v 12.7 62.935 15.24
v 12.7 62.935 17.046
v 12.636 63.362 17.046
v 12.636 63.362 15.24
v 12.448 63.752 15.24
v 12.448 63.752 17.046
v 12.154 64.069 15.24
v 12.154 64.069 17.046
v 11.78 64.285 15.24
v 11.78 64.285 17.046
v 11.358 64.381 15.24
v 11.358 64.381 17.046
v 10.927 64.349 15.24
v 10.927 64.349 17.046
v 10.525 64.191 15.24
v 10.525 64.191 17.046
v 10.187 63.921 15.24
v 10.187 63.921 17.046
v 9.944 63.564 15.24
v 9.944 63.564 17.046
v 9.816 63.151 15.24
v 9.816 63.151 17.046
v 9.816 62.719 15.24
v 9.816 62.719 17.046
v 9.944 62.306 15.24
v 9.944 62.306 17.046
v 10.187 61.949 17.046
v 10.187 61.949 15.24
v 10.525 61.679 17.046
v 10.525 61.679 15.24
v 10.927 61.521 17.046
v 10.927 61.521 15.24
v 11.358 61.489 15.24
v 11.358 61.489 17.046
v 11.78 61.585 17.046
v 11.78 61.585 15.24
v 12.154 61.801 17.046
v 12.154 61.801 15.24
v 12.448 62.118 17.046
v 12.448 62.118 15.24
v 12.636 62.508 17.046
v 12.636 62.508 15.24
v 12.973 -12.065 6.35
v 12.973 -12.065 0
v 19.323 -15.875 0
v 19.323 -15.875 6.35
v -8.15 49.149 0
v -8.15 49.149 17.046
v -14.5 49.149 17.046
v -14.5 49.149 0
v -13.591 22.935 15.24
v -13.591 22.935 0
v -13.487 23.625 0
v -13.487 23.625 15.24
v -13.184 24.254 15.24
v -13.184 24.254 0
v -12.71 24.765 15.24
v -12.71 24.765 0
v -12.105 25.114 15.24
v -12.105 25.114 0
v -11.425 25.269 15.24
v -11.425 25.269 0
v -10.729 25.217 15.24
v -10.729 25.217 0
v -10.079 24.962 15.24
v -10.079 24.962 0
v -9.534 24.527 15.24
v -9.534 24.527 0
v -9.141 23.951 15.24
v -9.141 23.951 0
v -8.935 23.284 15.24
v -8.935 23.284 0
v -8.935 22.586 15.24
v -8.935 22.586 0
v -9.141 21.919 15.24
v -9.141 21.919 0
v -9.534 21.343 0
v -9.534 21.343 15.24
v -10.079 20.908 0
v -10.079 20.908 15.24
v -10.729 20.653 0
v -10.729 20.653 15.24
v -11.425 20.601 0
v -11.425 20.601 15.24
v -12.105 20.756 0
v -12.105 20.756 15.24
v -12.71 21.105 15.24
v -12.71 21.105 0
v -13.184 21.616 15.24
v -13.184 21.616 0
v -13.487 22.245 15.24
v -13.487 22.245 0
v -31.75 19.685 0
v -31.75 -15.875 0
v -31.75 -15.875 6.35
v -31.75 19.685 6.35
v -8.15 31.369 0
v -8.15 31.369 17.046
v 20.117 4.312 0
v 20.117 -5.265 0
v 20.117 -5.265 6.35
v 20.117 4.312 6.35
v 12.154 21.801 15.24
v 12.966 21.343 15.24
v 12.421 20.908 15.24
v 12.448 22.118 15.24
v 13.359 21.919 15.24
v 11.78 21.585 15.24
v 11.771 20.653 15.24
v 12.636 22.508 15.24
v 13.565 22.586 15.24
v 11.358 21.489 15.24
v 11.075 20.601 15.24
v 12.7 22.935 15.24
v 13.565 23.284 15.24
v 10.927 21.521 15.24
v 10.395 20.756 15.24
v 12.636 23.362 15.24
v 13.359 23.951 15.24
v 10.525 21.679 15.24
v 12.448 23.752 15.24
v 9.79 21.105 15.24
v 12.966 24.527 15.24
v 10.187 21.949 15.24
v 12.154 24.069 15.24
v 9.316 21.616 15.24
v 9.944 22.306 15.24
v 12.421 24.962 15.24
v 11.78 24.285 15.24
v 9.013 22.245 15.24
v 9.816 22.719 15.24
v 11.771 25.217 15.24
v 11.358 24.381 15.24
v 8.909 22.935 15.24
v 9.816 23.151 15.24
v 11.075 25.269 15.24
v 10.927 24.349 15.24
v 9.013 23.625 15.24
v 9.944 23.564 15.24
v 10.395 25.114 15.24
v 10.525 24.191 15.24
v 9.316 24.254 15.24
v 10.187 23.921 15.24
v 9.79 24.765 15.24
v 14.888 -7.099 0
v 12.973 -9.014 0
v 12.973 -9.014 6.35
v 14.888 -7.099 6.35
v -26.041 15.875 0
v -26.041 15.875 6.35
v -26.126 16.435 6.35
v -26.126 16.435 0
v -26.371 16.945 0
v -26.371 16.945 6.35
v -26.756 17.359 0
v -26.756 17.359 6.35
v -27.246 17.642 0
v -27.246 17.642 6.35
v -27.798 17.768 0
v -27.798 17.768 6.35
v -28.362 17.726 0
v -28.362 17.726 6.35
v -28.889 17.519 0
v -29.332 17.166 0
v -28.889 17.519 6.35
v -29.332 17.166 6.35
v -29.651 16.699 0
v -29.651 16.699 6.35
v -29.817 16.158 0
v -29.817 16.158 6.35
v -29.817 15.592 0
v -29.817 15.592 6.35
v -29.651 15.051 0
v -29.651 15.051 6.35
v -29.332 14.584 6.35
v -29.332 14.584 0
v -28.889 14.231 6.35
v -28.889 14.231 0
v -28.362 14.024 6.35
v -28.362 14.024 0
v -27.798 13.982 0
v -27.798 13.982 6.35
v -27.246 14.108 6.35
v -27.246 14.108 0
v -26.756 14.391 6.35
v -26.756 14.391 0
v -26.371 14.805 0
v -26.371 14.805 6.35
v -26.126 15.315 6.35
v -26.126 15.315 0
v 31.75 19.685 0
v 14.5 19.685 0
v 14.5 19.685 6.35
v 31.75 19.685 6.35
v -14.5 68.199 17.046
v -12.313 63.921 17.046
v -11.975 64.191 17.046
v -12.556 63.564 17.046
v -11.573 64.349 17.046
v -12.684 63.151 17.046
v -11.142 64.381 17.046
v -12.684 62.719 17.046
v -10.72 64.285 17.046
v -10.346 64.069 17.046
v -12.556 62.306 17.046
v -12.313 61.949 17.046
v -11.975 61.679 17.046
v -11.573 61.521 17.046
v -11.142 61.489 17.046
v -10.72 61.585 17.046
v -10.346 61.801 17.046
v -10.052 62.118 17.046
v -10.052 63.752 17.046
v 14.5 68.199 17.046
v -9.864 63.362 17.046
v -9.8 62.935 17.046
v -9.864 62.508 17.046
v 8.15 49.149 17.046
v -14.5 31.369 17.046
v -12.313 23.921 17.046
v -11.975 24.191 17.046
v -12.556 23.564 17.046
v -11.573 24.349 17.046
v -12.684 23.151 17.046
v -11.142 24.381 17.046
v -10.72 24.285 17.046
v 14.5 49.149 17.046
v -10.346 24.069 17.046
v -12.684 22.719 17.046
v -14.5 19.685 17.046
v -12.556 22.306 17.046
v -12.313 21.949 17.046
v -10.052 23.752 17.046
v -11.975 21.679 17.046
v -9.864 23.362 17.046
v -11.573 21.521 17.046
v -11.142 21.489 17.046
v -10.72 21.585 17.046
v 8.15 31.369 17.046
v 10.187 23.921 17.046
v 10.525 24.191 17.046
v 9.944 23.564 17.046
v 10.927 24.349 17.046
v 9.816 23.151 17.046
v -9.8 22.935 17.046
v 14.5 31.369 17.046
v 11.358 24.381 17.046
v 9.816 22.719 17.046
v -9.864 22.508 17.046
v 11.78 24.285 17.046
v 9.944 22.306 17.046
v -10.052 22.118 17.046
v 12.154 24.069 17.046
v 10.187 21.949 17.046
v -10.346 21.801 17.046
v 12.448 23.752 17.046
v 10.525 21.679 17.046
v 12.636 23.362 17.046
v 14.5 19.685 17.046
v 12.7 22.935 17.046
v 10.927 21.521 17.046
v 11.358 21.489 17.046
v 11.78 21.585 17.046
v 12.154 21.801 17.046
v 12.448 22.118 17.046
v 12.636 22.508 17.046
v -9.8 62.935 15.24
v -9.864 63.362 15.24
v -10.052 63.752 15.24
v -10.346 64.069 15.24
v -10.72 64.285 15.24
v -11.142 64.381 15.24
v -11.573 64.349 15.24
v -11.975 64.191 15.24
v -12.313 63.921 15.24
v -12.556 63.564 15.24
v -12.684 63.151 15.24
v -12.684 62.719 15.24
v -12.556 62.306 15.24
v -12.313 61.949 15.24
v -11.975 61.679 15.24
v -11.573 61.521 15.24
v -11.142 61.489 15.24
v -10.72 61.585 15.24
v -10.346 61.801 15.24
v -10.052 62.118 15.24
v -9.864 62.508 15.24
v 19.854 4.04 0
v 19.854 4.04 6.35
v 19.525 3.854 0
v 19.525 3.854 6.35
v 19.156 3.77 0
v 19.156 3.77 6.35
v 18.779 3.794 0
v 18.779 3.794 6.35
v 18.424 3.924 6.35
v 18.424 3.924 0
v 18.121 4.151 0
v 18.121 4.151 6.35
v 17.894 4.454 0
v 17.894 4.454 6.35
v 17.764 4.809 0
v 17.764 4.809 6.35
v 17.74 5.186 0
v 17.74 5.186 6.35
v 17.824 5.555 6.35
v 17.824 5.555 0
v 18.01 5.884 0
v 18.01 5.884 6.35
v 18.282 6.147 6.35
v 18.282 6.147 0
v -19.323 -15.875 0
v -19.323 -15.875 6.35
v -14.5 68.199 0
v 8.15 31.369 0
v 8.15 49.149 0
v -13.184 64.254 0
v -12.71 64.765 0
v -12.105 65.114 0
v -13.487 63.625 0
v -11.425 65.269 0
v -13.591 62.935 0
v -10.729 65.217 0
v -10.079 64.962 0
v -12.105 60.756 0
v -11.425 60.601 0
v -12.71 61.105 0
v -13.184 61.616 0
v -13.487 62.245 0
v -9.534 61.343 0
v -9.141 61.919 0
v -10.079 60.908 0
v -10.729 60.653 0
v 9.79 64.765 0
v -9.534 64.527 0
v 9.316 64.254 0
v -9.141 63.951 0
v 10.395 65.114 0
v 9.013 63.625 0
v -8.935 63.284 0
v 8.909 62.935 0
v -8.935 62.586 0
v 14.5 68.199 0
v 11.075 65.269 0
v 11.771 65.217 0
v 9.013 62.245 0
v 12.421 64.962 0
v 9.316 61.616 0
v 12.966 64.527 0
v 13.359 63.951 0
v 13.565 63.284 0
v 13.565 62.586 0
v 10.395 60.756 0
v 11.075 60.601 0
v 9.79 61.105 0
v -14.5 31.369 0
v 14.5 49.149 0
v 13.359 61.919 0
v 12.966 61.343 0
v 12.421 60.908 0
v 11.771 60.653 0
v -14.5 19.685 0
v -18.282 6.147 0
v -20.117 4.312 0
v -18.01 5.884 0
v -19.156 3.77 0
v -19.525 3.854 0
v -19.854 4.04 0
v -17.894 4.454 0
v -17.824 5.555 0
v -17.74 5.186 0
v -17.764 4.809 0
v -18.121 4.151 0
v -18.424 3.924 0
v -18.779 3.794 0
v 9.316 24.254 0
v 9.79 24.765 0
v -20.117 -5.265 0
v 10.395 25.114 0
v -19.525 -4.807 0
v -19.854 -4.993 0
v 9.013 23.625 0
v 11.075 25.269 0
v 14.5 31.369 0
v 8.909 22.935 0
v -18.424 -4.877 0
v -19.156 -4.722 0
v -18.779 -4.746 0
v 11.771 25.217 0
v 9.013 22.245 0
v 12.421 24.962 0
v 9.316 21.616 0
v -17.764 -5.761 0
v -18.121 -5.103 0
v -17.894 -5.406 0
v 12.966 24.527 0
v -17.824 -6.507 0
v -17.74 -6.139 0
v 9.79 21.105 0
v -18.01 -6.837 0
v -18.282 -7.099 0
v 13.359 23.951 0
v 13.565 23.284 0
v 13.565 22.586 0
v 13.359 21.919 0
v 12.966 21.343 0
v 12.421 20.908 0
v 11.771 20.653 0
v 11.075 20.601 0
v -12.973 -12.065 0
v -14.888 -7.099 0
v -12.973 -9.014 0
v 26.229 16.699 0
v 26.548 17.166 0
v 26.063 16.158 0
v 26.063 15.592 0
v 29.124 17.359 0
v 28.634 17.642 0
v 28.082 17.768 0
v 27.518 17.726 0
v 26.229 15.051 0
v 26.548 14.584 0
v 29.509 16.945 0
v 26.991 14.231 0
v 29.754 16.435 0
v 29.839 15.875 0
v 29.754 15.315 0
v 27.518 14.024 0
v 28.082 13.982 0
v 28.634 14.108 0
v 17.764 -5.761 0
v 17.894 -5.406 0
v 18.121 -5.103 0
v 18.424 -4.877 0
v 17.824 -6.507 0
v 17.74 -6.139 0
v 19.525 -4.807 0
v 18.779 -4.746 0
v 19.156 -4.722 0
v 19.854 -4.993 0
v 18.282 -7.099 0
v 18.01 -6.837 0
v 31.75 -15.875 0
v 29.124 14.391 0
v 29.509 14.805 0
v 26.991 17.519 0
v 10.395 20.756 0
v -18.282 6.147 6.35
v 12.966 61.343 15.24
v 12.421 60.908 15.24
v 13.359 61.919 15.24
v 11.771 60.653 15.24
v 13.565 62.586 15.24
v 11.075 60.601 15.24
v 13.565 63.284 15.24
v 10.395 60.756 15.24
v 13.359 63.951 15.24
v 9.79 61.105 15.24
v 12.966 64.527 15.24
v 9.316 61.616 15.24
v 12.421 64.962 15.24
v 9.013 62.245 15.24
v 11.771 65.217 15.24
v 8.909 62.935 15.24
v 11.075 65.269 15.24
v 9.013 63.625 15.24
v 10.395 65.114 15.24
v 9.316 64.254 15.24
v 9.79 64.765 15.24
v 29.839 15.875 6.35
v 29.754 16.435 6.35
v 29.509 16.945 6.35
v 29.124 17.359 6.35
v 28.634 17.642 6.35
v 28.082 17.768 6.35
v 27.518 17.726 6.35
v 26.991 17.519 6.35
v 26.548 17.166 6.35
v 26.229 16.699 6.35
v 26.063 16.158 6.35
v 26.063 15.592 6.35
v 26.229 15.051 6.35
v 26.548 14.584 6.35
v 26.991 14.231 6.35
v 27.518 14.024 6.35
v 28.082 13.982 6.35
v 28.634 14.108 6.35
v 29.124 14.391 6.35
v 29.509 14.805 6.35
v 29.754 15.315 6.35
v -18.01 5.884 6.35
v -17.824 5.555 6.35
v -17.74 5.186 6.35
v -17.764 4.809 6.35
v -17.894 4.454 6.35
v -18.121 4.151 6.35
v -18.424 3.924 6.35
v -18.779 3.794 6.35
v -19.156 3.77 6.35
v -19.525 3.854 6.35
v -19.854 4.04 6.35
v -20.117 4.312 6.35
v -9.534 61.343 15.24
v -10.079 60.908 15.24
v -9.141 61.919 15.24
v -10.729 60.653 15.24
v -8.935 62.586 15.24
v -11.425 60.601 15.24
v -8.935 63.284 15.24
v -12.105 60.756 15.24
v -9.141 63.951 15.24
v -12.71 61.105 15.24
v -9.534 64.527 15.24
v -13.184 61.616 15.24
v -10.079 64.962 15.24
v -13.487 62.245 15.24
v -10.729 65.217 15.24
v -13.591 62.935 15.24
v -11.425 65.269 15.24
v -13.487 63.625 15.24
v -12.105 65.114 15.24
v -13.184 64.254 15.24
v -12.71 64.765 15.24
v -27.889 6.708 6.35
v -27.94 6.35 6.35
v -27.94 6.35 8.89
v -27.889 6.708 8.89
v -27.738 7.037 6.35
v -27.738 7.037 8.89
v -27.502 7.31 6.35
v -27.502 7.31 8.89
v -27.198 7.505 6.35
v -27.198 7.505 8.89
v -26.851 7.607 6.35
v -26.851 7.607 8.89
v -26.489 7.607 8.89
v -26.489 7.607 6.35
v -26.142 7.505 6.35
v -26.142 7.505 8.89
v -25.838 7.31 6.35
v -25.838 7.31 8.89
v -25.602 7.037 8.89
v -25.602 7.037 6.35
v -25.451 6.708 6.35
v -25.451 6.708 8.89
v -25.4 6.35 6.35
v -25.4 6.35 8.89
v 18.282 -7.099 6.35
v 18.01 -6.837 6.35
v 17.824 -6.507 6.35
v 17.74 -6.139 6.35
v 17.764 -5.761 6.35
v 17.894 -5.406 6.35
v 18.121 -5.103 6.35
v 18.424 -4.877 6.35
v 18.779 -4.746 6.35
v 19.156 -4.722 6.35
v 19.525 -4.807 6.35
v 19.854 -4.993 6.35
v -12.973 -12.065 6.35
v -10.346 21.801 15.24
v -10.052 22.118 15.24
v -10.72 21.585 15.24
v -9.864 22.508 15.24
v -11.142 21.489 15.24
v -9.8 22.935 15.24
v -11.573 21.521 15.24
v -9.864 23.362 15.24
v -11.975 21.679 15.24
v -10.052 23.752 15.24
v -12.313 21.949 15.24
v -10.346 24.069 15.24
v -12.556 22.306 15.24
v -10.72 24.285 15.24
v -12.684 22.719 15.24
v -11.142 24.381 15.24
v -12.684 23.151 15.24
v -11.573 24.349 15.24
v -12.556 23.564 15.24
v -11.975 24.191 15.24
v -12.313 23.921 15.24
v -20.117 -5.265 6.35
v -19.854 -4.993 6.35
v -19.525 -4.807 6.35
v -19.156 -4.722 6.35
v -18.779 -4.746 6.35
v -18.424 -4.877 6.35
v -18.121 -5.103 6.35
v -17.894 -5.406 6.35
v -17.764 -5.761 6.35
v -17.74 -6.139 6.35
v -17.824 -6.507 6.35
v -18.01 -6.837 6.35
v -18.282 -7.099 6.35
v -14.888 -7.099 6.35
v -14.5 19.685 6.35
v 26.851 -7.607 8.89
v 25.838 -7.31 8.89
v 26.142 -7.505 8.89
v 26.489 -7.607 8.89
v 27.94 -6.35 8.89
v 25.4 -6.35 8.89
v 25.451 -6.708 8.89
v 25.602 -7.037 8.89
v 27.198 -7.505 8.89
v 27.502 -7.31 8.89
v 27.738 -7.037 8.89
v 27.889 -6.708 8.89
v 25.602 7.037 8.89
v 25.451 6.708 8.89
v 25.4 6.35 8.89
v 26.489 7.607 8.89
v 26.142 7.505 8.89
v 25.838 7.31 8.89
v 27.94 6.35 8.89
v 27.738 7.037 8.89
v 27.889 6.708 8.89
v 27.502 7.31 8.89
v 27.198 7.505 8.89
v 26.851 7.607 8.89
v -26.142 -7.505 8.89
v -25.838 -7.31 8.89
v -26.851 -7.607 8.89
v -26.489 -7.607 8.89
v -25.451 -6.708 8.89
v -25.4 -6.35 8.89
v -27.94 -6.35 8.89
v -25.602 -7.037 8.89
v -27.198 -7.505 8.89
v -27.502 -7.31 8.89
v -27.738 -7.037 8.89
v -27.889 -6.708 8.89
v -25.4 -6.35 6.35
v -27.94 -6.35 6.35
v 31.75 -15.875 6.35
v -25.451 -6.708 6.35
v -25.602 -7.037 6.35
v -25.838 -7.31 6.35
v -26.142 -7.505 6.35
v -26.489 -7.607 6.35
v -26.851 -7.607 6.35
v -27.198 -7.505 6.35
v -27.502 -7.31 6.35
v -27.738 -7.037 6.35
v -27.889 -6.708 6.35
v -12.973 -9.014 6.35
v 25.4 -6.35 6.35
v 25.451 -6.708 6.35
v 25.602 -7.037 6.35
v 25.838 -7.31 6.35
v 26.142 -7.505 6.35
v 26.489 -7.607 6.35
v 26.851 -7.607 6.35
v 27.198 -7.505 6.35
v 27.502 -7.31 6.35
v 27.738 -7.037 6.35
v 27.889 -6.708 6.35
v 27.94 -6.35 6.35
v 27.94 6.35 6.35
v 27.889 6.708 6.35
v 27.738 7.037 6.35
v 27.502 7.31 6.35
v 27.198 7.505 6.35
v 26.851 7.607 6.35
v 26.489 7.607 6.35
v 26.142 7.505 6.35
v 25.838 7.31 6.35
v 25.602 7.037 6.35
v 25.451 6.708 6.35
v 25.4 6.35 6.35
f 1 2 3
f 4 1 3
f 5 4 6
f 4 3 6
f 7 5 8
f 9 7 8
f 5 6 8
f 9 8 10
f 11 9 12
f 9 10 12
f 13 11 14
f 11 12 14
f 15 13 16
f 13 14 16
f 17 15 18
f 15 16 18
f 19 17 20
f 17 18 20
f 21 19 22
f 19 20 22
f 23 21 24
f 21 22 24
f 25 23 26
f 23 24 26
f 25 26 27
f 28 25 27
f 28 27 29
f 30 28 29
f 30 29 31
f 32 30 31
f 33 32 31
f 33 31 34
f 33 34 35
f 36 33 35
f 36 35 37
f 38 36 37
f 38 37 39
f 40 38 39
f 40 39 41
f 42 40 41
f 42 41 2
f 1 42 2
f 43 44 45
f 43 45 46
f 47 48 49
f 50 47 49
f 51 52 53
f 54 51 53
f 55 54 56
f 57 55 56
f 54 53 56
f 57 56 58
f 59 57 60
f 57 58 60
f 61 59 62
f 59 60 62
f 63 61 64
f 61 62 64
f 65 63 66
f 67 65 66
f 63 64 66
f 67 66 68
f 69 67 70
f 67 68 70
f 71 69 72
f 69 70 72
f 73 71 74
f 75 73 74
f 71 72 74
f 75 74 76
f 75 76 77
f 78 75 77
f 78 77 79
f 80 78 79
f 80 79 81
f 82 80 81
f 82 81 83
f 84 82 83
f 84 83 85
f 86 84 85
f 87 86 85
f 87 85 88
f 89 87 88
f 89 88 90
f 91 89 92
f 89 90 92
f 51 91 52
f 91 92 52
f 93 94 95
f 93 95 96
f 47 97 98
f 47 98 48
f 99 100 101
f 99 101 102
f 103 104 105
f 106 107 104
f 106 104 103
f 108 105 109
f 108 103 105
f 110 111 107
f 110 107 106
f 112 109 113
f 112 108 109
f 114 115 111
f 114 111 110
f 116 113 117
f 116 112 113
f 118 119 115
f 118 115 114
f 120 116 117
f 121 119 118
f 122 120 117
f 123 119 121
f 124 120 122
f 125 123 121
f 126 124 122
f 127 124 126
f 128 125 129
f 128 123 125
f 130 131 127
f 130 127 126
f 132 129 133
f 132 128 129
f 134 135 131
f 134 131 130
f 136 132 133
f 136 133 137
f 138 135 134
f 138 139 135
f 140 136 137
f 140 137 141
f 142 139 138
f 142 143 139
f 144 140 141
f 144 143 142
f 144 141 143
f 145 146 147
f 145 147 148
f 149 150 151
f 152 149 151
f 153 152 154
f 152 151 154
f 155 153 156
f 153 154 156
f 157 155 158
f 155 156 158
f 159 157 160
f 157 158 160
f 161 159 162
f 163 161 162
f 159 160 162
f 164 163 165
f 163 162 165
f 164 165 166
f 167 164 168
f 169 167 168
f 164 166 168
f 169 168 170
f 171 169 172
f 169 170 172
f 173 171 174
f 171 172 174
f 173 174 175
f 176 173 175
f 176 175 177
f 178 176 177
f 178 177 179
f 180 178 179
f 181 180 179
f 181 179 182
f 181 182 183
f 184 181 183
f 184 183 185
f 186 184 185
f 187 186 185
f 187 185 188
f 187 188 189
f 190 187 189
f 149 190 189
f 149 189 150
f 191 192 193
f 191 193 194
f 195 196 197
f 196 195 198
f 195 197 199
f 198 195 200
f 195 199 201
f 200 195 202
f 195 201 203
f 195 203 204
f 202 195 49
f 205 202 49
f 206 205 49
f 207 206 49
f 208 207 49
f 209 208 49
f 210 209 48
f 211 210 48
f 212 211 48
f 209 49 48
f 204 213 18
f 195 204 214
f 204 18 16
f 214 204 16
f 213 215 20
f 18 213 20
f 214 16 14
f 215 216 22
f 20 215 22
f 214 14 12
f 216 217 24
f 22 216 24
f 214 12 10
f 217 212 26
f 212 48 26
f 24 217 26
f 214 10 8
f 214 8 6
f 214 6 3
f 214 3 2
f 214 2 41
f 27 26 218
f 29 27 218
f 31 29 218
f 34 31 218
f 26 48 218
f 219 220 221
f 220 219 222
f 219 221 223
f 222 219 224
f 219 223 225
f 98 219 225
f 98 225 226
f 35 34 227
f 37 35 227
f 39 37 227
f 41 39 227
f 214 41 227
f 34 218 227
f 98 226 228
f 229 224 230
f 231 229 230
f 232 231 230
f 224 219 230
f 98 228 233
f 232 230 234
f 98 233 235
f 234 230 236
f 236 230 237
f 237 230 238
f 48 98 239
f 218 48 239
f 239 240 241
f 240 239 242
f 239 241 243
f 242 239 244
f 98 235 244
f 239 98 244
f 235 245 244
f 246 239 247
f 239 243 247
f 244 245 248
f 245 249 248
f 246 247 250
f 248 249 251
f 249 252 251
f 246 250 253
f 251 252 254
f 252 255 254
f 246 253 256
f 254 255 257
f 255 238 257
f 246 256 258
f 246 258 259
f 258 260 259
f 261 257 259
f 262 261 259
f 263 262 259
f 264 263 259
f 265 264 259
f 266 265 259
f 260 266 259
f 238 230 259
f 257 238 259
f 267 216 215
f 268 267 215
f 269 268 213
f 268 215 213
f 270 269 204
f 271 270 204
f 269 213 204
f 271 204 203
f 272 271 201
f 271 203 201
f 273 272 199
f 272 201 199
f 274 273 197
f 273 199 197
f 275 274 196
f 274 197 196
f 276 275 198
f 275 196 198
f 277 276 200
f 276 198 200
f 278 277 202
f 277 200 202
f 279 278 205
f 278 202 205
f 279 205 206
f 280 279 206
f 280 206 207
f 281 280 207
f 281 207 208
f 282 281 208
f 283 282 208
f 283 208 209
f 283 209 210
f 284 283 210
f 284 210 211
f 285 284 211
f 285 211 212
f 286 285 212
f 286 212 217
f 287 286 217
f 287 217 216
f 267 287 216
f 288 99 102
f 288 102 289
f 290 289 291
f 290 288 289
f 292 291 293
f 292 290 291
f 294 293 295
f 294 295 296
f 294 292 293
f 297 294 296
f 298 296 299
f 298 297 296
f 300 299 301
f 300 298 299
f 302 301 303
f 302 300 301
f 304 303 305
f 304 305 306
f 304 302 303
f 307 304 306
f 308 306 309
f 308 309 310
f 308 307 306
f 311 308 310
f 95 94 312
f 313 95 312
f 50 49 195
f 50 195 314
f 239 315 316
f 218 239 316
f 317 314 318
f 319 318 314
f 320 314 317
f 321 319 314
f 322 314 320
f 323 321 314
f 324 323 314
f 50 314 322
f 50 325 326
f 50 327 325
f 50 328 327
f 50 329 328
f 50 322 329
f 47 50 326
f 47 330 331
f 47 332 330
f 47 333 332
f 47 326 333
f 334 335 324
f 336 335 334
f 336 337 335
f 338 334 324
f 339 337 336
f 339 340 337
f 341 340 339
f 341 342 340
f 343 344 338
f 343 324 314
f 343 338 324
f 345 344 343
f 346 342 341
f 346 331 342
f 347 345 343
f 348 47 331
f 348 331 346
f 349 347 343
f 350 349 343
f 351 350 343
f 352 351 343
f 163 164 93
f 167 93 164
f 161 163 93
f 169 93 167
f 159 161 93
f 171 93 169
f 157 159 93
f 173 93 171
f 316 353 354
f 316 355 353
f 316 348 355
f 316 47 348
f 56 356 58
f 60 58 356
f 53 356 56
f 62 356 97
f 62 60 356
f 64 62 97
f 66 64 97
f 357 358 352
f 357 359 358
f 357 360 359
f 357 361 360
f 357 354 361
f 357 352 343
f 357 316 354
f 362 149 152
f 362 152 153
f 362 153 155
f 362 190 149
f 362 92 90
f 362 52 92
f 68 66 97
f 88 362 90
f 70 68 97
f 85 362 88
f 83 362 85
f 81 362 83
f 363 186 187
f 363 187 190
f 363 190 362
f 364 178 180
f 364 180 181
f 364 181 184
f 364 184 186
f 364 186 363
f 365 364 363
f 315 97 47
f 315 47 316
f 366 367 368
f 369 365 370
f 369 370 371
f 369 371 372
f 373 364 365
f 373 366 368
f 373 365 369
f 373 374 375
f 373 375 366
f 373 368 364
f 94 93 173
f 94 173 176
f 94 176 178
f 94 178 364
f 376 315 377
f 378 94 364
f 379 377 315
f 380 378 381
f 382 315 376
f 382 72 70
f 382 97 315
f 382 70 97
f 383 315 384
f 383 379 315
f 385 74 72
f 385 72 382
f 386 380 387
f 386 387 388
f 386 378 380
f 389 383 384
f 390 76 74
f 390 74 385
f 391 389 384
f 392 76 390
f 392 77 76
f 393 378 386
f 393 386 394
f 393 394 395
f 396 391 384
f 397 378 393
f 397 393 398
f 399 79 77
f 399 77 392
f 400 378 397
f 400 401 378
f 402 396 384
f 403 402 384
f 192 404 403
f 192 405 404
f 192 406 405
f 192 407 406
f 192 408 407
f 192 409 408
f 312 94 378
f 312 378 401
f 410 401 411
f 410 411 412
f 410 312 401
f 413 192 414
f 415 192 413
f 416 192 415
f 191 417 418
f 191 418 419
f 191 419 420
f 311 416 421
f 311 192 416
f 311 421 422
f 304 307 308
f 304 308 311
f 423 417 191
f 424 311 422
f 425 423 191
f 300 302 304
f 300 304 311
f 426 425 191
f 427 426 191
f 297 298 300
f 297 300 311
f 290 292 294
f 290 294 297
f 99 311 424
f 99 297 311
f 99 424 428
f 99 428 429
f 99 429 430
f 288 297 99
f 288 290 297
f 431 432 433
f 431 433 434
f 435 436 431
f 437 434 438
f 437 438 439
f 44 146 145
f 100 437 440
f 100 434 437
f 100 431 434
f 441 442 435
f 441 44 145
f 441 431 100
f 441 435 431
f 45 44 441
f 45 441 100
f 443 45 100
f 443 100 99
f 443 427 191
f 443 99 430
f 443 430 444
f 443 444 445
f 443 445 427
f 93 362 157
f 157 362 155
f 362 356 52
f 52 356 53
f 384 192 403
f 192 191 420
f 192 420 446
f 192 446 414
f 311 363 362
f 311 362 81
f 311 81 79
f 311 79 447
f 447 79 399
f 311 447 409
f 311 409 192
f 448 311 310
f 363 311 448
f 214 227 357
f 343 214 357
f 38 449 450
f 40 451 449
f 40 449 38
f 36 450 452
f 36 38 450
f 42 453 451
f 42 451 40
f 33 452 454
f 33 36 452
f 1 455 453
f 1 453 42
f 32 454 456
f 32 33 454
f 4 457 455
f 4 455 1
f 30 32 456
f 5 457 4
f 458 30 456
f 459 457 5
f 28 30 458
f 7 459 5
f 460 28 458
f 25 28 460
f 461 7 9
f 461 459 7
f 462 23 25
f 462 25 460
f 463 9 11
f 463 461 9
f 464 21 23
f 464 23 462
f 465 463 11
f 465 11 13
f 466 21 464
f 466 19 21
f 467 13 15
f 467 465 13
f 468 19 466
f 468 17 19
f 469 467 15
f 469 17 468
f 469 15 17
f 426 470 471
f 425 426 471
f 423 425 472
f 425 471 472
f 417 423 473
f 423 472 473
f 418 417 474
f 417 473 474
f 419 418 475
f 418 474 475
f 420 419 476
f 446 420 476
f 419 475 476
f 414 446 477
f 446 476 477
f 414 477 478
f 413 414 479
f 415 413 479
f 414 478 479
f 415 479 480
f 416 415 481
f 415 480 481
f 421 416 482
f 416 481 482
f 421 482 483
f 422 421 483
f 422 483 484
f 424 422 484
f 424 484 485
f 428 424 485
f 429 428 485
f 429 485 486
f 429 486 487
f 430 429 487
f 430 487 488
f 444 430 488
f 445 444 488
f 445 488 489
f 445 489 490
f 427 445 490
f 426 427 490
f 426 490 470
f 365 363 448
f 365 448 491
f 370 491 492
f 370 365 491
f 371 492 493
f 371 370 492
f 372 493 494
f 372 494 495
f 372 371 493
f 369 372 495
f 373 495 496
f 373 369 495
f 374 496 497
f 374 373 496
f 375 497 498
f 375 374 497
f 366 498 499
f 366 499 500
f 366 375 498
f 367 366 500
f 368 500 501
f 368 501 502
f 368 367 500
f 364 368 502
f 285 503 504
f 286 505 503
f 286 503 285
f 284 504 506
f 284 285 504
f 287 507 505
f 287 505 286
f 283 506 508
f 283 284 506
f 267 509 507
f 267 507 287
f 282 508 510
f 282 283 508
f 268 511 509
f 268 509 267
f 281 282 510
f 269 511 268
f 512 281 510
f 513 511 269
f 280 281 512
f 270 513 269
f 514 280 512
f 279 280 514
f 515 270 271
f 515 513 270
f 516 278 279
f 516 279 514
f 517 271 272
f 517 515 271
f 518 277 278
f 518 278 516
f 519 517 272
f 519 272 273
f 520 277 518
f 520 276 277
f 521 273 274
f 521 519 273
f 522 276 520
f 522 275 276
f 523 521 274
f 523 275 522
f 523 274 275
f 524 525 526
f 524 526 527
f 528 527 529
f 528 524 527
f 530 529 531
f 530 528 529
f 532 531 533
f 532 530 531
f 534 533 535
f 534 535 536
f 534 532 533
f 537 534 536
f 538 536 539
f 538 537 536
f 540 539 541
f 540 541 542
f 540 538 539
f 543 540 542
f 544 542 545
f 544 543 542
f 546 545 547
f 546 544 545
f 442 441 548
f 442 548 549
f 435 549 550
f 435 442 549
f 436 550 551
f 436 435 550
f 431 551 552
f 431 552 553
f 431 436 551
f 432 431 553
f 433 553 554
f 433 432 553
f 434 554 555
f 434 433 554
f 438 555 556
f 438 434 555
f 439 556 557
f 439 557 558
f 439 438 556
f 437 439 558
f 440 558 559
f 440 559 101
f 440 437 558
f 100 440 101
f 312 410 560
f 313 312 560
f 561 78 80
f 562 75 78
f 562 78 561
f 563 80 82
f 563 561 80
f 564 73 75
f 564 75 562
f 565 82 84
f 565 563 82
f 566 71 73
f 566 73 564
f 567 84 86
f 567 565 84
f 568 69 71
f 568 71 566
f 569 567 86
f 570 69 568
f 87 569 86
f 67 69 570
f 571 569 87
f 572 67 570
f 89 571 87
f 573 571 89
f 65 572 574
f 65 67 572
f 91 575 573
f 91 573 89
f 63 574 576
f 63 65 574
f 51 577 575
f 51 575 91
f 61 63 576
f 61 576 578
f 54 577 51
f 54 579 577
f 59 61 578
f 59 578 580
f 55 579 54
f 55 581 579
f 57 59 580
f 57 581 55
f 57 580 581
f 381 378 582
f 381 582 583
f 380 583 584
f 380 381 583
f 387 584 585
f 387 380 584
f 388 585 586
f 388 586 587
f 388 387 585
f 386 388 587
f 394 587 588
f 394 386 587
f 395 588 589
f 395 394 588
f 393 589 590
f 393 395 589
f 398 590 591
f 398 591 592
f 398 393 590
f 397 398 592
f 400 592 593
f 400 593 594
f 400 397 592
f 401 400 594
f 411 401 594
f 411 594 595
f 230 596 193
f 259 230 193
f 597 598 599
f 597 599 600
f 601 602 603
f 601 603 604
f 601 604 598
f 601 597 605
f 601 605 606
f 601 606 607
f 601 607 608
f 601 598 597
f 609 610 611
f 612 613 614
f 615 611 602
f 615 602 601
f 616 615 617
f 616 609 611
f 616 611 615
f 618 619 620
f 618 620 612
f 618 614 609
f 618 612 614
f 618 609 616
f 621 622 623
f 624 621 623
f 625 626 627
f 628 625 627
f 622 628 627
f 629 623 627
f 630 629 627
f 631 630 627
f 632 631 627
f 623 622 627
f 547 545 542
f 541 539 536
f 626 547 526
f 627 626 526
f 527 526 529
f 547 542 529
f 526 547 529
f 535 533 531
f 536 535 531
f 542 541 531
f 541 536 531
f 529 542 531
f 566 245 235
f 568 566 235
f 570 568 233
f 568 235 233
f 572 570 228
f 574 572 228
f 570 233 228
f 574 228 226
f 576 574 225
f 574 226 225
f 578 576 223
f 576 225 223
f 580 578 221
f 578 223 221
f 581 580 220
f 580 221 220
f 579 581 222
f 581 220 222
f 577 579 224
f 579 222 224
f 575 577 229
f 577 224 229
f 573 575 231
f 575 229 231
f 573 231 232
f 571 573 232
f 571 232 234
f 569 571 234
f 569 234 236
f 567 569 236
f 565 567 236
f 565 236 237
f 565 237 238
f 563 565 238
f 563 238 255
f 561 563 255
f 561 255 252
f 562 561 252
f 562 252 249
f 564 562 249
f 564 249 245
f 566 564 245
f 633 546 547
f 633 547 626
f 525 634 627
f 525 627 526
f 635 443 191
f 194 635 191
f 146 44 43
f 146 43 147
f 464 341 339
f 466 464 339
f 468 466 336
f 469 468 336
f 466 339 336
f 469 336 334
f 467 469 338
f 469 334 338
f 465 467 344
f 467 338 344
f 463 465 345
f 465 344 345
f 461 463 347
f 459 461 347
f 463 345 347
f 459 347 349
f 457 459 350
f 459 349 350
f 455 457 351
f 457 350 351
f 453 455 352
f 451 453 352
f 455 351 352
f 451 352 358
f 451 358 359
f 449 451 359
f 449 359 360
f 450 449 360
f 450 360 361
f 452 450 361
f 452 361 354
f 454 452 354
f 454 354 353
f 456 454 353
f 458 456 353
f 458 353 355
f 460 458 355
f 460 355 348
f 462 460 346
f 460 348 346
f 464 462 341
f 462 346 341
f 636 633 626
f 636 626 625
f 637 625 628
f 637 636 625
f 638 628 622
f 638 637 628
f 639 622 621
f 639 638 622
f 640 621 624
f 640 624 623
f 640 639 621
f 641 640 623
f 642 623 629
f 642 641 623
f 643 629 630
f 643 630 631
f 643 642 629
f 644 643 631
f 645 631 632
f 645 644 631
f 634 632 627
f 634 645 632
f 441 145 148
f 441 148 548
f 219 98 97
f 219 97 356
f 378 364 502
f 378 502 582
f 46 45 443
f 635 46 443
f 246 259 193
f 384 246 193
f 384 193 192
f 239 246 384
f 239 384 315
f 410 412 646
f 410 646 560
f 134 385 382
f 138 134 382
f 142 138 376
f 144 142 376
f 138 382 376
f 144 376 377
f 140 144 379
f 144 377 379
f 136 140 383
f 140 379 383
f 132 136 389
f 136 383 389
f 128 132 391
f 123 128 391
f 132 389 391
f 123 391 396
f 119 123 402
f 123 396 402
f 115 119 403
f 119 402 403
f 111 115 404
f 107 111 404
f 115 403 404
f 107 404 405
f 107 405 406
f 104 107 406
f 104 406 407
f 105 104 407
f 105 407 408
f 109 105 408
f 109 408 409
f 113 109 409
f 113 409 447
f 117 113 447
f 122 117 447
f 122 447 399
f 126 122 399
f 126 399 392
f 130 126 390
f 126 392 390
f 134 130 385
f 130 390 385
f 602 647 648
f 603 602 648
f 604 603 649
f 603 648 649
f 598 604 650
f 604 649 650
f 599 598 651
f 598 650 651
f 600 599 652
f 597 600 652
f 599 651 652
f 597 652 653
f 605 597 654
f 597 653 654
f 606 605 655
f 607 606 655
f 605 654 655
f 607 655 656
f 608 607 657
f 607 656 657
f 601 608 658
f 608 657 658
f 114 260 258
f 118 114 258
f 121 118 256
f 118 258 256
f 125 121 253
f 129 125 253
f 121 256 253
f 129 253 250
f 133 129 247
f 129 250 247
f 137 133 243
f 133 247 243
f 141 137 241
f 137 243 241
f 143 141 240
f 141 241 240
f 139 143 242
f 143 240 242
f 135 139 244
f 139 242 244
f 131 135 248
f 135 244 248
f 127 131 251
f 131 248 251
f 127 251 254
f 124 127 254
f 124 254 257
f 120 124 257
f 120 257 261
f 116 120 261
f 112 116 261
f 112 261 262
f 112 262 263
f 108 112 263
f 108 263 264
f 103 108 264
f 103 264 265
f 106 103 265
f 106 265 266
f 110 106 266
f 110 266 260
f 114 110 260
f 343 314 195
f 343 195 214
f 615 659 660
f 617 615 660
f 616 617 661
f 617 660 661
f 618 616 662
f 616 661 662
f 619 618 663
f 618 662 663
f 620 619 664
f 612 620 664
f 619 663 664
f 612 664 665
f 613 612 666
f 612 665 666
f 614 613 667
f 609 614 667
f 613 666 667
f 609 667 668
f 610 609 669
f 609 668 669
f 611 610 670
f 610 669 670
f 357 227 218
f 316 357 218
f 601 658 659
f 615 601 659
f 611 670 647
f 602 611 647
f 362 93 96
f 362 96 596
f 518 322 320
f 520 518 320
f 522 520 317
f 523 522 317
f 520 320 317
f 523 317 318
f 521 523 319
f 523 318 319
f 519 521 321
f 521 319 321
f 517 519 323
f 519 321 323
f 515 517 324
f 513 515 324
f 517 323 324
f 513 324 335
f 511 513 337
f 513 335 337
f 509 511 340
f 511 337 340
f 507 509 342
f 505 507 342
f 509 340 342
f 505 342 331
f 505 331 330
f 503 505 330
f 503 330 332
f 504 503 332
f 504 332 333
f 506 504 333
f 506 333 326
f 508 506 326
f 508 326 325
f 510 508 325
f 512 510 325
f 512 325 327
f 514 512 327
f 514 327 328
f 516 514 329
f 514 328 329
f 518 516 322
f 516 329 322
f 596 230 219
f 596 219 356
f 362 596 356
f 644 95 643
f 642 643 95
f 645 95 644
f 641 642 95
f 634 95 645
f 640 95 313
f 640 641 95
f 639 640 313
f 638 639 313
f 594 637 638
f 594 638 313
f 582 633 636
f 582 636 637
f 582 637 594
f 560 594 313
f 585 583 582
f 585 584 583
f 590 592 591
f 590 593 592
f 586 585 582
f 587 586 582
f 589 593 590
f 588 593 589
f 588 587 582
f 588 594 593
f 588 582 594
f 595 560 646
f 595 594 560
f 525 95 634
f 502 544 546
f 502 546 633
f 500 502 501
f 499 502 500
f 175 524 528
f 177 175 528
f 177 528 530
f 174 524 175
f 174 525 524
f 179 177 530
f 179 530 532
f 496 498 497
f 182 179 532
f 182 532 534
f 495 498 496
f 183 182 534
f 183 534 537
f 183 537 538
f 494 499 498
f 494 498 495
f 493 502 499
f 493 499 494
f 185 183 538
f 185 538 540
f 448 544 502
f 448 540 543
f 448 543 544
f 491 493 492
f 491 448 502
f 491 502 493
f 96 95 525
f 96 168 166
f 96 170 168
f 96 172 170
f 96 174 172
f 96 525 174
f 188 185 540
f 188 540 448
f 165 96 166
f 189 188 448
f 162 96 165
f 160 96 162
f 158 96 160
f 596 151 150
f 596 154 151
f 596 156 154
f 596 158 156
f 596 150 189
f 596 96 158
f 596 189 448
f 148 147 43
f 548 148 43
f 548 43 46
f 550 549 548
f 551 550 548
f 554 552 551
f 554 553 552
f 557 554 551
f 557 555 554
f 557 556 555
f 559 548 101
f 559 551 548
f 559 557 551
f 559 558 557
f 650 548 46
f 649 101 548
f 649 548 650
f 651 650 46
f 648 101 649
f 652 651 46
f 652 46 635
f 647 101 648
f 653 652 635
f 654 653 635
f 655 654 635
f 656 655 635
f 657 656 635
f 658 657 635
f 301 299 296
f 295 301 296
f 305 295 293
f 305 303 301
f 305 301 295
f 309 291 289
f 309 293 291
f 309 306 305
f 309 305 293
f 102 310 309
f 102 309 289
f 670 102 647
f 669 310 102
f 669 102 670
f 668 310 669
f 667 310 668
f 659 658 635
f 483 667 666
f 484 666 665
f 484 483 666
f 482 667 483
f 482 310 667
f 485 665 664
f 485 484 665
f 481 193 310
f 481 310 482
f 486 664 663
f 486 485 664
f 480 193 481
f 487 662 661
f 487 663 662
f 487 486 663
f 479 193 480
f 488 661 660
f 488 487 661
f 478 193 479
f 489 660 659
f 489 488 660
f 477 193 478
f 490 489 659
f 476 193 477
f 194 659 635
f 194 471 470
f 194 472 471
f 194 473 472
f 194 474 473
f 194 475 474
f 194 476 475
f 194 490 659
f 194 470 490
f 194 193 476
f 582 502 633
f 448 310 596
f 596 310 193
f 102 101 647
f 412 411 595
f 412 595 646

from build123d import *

# Parameters (mm, degrees)
ESQUISSE1_W             = 63.5
ESQUISSE1_H             = 35.56
BOSS_EXTRU_1_DEPTH      = 6.35
BOSS_EXTRU_2_DEPTH      = 2.54
EMPREINTE1_DEPTH        = 6.35
D_PLACER_LA_FACE2_DEPTH = 6.35
CHANFREIN1_SIZE         = 6.35
CHANFREIN1_SIZE2        = 3.81
CHANFREIN2_SIZE         = 6.35
CHANFREIN2_SIZE2        = 3.81
ESQUISSE3_W             = 29
ESQUISSE3_H             = 17.046330794
BOSS_EXTRU_3_DEPTH      = 48.514
ESQUISSE4_R             = 2.341041465
ENL_V_MAT_EXTRU_1_DEPTH = 15.24
ESQUISSE5_R             = 1.397
ESQUISSE5_W             = 6.35
ESQUISSE5_H             = 17.78
ENL_V_MAT_EXTRU_2_DEPTH = 78.134580407
D_GAGEMENT_M2_51_D      = 2.9
D_GAGEMENT_61_D         = 3.7973


# Read off the part's stored shape, not the designer's step: Empreinte1, Déplacer la face2
with BuildPart() as part:
    # Esquisse1 → Boss.-Extru.1 (new body)
    with BuildSketch(Plane.XY):
        with Locations((0, 1.905)):
            Rectangle(ESQUISSE1_W, ESQUISSE1_H)
    extrude(amount=BOSS_EXTRU_1_DEPTH)

    # Esquisse2 → Boss.-Extru.2 (add)
    with BuildSketch(Plane.XY.offset(6.35)):
        with BuildLine():
            Line((-27.94, -6.35), (-27.94, 6.35))
            ThreePointArc((-27.94, 6.35), (-26.67, 7.62), (-25.4, 6.35))
            Line((-25.4, 6.35), (-25.4, -6.35))
            ThreePointArc((-25.4, -6.35), (-26.67, -7.62), (-27.94, -6.35))
        make_face()
    boss_extru_2 = extrude(amount=BOSS_EXTRU_2_DEPTH)

    # Symétrie1: Boss.-Extru.2 across plane
    add(boss_extru_2.mirror(Plane(origin=(0, 0, 0), x_dir=(0, 0, 1), z_dir=(1, 0, 0))))

    # Empreinte1 outline → Empreinte1 (cut)
    with BuildSketch(Plane.XY):
        with BuildLine():
            Line((-11.90625, -8.5725), (-11.90625, -15.875))
            Line((-11.90625, -15.875), (11.90625, -15.875))
            Line((11.90625, -15.875), (11.90625, -8.5725))
            Line((11.90625, -8.5725), (14.44625, -6.0325))
            Line((14.44625, -6.0325), (16.66875, -6.0325))
            ThreePointArc((16.66875, -6.0325), (17.366201977, -4.348701977), (19.05, -3.65125))
            Line((19.05, -3.65125), (19.05, 2.69875))
            ThreePointArc((19.05, 2.69875), (17.366201977, 3.396201977), (16.66875, 5.08))
            Line((16.66875, 5.08), (-16.66875, 5.08))
            ThreePointArc((-16.66875, 5.08), (-17.366201977, 3.396201977), (-19.05, 2.69875))
            Line((-19.05, 2.69875), (-19.05, -3.65125))
            ThreePointArc((-19.05, -3.65125), (-17.366201977, -4.348701977), (-16.66875, -6.0325))
            Line((-16.66875, -6.0325), (-14.44625, -6.0325))
            Line((-14.44625, -6.0325), (-11.90625, -8.5725))
        make_face()
    extrude(amount=EMPREINTE1_DEPTH, mode=Mode.SUBTRACT)

    # Déplacer la face2 outline → Déplacer la face2 (cut)
    with BuildSketch(Plane.XY):
        with BuildLine():
            Line((-12.97305, -9.014383028), (-12.97305, -15.875))
            Line((-12.97305, -15.875), (-11.90625, -15.875))
            Line((-11.90625, -15.875), (-11.90625, -8.5725))
            Line((-11.90625, -8.5725), (-14.44625, -6.0325))
            Line((-14.44625, -6.0325), (-16.66875, -6.0325))
            ThreePointArc((-16.66875, -6.0325), (-17.366201977, -4.348701977), (-19.05, -3.65125))
            Line((-19.05, -3.65125), (-19.05, 2.69875))
            ThreePointArc((-19.05, 2.69875), (-17.366201977, 3.396201977), (-16.66875, 5.08))
            Line((-16.66875, 5.08), (16.66875, 5.08))
            ThreePointArc((16.66875, 5.08), (17.366201977, 3.396201977), (19.05, 2.69875))
            Line((19.05, 2.69875), (19.05, -3.65125))
            ThreePointArc((19.05, -3.65125), (17.366201977, -4.348701977), (16.66875, -6.0325))
            Line((16.66875, -6.0325), (14.44625, -6.0325))
            Line((14.44625, -6.0325), (11.90625, -8.5725))
            Line((11.90625, -8.5725), (11.90625, -15.875))
            Line((11.90625, -15.875), (12.97305, -15.875))
            Line((12.97305, -15.875), (12.97305, -9.014383028))
            Line((12.97305, -9.014383028), (14.888133028, -7.0993))
            Line((14.888133028, -7.0993), (18.282069949, -7.0993))
            ThreePointArc((18.282069949, -7.0993), (18.120543491, -5.103043491), (20.1168, -5.264569949))
            Line((20.1168, -5.264569949), (20.1168, 4.312069949))
            ThreePointArc((20.1168, 4.312069949), (18.120543491, 4.150543491), (18.282069949, 6.1468))
            Line((18.282069949, 6.1468), (-18.282069949, 6.1468))
            ThreePointArc((-18.282069949, 6.1468), (-18.120543491, 4.150543491), (-20.1168, 4.312069949))
            Line((-20.1168, 4.312069949), (-20.1168, -5.264569949))
            ThreePointArc((-20.1168, -5.264569949), (-18.120543491, -5.103043491), (-18.282069949, -7.0993))
            Line((-18.282069949, -7.0993), (-14.888133028, -7.0993))
            Line((-14.888133028, -7.0993), (-12.97305, -9.014383028))
        make_face()
    extrude(amount=D_PLACER_LA_FACE2_DEPTH, mode=Mode.SUBTRACT)

    # Chanfrein1
    chanfrein1_edges = [part.edges().sort_by_distance(p)[0] for p in [
        (12.97305, -15.875, 3.175),
    ]]
    chanfrein1_side = [part.faces().sort_by_distance(p)[0] for p in [
        (22.361525, -15.875, 3.175),
    ]]
    chamfer(chanfrein1_edges, length=CHANFREIN1_SIZE, length2=CHANFREIN1_SIZE2, reference=chanfrein1_side[0])

    # Chanfrein2
    chanfrein2_edges = [part.edges().sort_by_distance(p)[0] for p in [
        (-12.97305, -15.875, 3.175),
    ]]
    chanfrein2_side = [part.faces().sort_by_distance(p)[0] for p in [
        (-22.361525, -15.875, 3.175),
    ]]
    chamfer(chanfrein2_edges, length=CHANFREIN2_SIZE, length2=CHANFREIN2_SIZE2, reference=chanfrein2_side[0])

    # Esquisse3 → Boss.-Extru.3 (add)
    with BuildSketch(Plane(origin=(0, 19.685, 0), x_dir=(1, 0, 0), z_dir=(0, 1, 0))):
        with Locations((0, -8.523165397)):
            Rectangle(ESQUISSE3_W, ESQUISSE3_H)
    extrude(amount=BOSS_EXTRU_3_DEPTH)

    # Esquisse4 → Enlèv. mat.-Extru.1 (cut)
    with BuildSketch(Plane(origin=(0, 0, 0), x_dir=(-1, 0, 0), z_dir=(0, 0, -1))):
        with Locations((-11.25, 62.935)):
            Circle(ESQUISSE4_R)
        with Locations((11.25, 62.935)):
            Circle(ESQUISSE4_R)
        with Locations((11.25, 22.935)):
            Circle(ESQUISSE4_R)
        with Locations((-11.25, 22.935)):
            Circle(ESQUISSE4_R)
    extrude(amount=-ENL_V_MAT_EXTRU_1_DEPTH, mode=Mode.SUBTRACT)

    # Esquisse5 → Enlèv. mat.-Extru.2 (cut, through all)
    with BuildSketch(Plane(origin=(0, 0, 0), x_dir=(-1, 0, 0), z_dir=(0, 0, -1))):
        with Locations((-11.25, 22.935)):
            Circle(ESQUISSE5_R)
        with Locations((-11.25, 62.935)):
            Circle(ESQUISSE5_R)
        with Locations((11.25, 62.935)):
            Circle(ESQUISSE5_R)
        with Locations((11.25, 22.935)):
            Circle(ESQUISSE5_R)
        with Locations((11.325, 40.259)):
            Rectangle(ESQUISSE5_W, ESQUISSE5_H)
        with Locations((-11.325, 40.259)):
            Rectangle(ESQUISSE5_W, ESQUISSE5_H)
    extrude(amount=-ENL_V_MAT_EXTRU_2_DEPTH, mode=Mode.SUBTRACT)

    # Dégagement M2.51 (through all)
    with Locations(Plane(origin=(0, 0, 0), x_dir=(-1, 0, 0), z_dir=(0, 0, -1))):
        with Locations((11.25, 62.935), (-11.25, 62.935), (11.25, 22.935), (-11.25, 22.935)):
            Hole(D_GAGEMENT_M2_51_D / 2)

    # Dégagement #61 (through all)
    with Locations(Plane(origin=(0, 0, 0), x_dir=(-1, 0, 0), z_dir=(0, 0, -1))):
        with Locations((-27.94, 15.875), (27.94, 15.875)):
            Hole(D_GAGEMENT_61_D / 2)


solid = part.part
